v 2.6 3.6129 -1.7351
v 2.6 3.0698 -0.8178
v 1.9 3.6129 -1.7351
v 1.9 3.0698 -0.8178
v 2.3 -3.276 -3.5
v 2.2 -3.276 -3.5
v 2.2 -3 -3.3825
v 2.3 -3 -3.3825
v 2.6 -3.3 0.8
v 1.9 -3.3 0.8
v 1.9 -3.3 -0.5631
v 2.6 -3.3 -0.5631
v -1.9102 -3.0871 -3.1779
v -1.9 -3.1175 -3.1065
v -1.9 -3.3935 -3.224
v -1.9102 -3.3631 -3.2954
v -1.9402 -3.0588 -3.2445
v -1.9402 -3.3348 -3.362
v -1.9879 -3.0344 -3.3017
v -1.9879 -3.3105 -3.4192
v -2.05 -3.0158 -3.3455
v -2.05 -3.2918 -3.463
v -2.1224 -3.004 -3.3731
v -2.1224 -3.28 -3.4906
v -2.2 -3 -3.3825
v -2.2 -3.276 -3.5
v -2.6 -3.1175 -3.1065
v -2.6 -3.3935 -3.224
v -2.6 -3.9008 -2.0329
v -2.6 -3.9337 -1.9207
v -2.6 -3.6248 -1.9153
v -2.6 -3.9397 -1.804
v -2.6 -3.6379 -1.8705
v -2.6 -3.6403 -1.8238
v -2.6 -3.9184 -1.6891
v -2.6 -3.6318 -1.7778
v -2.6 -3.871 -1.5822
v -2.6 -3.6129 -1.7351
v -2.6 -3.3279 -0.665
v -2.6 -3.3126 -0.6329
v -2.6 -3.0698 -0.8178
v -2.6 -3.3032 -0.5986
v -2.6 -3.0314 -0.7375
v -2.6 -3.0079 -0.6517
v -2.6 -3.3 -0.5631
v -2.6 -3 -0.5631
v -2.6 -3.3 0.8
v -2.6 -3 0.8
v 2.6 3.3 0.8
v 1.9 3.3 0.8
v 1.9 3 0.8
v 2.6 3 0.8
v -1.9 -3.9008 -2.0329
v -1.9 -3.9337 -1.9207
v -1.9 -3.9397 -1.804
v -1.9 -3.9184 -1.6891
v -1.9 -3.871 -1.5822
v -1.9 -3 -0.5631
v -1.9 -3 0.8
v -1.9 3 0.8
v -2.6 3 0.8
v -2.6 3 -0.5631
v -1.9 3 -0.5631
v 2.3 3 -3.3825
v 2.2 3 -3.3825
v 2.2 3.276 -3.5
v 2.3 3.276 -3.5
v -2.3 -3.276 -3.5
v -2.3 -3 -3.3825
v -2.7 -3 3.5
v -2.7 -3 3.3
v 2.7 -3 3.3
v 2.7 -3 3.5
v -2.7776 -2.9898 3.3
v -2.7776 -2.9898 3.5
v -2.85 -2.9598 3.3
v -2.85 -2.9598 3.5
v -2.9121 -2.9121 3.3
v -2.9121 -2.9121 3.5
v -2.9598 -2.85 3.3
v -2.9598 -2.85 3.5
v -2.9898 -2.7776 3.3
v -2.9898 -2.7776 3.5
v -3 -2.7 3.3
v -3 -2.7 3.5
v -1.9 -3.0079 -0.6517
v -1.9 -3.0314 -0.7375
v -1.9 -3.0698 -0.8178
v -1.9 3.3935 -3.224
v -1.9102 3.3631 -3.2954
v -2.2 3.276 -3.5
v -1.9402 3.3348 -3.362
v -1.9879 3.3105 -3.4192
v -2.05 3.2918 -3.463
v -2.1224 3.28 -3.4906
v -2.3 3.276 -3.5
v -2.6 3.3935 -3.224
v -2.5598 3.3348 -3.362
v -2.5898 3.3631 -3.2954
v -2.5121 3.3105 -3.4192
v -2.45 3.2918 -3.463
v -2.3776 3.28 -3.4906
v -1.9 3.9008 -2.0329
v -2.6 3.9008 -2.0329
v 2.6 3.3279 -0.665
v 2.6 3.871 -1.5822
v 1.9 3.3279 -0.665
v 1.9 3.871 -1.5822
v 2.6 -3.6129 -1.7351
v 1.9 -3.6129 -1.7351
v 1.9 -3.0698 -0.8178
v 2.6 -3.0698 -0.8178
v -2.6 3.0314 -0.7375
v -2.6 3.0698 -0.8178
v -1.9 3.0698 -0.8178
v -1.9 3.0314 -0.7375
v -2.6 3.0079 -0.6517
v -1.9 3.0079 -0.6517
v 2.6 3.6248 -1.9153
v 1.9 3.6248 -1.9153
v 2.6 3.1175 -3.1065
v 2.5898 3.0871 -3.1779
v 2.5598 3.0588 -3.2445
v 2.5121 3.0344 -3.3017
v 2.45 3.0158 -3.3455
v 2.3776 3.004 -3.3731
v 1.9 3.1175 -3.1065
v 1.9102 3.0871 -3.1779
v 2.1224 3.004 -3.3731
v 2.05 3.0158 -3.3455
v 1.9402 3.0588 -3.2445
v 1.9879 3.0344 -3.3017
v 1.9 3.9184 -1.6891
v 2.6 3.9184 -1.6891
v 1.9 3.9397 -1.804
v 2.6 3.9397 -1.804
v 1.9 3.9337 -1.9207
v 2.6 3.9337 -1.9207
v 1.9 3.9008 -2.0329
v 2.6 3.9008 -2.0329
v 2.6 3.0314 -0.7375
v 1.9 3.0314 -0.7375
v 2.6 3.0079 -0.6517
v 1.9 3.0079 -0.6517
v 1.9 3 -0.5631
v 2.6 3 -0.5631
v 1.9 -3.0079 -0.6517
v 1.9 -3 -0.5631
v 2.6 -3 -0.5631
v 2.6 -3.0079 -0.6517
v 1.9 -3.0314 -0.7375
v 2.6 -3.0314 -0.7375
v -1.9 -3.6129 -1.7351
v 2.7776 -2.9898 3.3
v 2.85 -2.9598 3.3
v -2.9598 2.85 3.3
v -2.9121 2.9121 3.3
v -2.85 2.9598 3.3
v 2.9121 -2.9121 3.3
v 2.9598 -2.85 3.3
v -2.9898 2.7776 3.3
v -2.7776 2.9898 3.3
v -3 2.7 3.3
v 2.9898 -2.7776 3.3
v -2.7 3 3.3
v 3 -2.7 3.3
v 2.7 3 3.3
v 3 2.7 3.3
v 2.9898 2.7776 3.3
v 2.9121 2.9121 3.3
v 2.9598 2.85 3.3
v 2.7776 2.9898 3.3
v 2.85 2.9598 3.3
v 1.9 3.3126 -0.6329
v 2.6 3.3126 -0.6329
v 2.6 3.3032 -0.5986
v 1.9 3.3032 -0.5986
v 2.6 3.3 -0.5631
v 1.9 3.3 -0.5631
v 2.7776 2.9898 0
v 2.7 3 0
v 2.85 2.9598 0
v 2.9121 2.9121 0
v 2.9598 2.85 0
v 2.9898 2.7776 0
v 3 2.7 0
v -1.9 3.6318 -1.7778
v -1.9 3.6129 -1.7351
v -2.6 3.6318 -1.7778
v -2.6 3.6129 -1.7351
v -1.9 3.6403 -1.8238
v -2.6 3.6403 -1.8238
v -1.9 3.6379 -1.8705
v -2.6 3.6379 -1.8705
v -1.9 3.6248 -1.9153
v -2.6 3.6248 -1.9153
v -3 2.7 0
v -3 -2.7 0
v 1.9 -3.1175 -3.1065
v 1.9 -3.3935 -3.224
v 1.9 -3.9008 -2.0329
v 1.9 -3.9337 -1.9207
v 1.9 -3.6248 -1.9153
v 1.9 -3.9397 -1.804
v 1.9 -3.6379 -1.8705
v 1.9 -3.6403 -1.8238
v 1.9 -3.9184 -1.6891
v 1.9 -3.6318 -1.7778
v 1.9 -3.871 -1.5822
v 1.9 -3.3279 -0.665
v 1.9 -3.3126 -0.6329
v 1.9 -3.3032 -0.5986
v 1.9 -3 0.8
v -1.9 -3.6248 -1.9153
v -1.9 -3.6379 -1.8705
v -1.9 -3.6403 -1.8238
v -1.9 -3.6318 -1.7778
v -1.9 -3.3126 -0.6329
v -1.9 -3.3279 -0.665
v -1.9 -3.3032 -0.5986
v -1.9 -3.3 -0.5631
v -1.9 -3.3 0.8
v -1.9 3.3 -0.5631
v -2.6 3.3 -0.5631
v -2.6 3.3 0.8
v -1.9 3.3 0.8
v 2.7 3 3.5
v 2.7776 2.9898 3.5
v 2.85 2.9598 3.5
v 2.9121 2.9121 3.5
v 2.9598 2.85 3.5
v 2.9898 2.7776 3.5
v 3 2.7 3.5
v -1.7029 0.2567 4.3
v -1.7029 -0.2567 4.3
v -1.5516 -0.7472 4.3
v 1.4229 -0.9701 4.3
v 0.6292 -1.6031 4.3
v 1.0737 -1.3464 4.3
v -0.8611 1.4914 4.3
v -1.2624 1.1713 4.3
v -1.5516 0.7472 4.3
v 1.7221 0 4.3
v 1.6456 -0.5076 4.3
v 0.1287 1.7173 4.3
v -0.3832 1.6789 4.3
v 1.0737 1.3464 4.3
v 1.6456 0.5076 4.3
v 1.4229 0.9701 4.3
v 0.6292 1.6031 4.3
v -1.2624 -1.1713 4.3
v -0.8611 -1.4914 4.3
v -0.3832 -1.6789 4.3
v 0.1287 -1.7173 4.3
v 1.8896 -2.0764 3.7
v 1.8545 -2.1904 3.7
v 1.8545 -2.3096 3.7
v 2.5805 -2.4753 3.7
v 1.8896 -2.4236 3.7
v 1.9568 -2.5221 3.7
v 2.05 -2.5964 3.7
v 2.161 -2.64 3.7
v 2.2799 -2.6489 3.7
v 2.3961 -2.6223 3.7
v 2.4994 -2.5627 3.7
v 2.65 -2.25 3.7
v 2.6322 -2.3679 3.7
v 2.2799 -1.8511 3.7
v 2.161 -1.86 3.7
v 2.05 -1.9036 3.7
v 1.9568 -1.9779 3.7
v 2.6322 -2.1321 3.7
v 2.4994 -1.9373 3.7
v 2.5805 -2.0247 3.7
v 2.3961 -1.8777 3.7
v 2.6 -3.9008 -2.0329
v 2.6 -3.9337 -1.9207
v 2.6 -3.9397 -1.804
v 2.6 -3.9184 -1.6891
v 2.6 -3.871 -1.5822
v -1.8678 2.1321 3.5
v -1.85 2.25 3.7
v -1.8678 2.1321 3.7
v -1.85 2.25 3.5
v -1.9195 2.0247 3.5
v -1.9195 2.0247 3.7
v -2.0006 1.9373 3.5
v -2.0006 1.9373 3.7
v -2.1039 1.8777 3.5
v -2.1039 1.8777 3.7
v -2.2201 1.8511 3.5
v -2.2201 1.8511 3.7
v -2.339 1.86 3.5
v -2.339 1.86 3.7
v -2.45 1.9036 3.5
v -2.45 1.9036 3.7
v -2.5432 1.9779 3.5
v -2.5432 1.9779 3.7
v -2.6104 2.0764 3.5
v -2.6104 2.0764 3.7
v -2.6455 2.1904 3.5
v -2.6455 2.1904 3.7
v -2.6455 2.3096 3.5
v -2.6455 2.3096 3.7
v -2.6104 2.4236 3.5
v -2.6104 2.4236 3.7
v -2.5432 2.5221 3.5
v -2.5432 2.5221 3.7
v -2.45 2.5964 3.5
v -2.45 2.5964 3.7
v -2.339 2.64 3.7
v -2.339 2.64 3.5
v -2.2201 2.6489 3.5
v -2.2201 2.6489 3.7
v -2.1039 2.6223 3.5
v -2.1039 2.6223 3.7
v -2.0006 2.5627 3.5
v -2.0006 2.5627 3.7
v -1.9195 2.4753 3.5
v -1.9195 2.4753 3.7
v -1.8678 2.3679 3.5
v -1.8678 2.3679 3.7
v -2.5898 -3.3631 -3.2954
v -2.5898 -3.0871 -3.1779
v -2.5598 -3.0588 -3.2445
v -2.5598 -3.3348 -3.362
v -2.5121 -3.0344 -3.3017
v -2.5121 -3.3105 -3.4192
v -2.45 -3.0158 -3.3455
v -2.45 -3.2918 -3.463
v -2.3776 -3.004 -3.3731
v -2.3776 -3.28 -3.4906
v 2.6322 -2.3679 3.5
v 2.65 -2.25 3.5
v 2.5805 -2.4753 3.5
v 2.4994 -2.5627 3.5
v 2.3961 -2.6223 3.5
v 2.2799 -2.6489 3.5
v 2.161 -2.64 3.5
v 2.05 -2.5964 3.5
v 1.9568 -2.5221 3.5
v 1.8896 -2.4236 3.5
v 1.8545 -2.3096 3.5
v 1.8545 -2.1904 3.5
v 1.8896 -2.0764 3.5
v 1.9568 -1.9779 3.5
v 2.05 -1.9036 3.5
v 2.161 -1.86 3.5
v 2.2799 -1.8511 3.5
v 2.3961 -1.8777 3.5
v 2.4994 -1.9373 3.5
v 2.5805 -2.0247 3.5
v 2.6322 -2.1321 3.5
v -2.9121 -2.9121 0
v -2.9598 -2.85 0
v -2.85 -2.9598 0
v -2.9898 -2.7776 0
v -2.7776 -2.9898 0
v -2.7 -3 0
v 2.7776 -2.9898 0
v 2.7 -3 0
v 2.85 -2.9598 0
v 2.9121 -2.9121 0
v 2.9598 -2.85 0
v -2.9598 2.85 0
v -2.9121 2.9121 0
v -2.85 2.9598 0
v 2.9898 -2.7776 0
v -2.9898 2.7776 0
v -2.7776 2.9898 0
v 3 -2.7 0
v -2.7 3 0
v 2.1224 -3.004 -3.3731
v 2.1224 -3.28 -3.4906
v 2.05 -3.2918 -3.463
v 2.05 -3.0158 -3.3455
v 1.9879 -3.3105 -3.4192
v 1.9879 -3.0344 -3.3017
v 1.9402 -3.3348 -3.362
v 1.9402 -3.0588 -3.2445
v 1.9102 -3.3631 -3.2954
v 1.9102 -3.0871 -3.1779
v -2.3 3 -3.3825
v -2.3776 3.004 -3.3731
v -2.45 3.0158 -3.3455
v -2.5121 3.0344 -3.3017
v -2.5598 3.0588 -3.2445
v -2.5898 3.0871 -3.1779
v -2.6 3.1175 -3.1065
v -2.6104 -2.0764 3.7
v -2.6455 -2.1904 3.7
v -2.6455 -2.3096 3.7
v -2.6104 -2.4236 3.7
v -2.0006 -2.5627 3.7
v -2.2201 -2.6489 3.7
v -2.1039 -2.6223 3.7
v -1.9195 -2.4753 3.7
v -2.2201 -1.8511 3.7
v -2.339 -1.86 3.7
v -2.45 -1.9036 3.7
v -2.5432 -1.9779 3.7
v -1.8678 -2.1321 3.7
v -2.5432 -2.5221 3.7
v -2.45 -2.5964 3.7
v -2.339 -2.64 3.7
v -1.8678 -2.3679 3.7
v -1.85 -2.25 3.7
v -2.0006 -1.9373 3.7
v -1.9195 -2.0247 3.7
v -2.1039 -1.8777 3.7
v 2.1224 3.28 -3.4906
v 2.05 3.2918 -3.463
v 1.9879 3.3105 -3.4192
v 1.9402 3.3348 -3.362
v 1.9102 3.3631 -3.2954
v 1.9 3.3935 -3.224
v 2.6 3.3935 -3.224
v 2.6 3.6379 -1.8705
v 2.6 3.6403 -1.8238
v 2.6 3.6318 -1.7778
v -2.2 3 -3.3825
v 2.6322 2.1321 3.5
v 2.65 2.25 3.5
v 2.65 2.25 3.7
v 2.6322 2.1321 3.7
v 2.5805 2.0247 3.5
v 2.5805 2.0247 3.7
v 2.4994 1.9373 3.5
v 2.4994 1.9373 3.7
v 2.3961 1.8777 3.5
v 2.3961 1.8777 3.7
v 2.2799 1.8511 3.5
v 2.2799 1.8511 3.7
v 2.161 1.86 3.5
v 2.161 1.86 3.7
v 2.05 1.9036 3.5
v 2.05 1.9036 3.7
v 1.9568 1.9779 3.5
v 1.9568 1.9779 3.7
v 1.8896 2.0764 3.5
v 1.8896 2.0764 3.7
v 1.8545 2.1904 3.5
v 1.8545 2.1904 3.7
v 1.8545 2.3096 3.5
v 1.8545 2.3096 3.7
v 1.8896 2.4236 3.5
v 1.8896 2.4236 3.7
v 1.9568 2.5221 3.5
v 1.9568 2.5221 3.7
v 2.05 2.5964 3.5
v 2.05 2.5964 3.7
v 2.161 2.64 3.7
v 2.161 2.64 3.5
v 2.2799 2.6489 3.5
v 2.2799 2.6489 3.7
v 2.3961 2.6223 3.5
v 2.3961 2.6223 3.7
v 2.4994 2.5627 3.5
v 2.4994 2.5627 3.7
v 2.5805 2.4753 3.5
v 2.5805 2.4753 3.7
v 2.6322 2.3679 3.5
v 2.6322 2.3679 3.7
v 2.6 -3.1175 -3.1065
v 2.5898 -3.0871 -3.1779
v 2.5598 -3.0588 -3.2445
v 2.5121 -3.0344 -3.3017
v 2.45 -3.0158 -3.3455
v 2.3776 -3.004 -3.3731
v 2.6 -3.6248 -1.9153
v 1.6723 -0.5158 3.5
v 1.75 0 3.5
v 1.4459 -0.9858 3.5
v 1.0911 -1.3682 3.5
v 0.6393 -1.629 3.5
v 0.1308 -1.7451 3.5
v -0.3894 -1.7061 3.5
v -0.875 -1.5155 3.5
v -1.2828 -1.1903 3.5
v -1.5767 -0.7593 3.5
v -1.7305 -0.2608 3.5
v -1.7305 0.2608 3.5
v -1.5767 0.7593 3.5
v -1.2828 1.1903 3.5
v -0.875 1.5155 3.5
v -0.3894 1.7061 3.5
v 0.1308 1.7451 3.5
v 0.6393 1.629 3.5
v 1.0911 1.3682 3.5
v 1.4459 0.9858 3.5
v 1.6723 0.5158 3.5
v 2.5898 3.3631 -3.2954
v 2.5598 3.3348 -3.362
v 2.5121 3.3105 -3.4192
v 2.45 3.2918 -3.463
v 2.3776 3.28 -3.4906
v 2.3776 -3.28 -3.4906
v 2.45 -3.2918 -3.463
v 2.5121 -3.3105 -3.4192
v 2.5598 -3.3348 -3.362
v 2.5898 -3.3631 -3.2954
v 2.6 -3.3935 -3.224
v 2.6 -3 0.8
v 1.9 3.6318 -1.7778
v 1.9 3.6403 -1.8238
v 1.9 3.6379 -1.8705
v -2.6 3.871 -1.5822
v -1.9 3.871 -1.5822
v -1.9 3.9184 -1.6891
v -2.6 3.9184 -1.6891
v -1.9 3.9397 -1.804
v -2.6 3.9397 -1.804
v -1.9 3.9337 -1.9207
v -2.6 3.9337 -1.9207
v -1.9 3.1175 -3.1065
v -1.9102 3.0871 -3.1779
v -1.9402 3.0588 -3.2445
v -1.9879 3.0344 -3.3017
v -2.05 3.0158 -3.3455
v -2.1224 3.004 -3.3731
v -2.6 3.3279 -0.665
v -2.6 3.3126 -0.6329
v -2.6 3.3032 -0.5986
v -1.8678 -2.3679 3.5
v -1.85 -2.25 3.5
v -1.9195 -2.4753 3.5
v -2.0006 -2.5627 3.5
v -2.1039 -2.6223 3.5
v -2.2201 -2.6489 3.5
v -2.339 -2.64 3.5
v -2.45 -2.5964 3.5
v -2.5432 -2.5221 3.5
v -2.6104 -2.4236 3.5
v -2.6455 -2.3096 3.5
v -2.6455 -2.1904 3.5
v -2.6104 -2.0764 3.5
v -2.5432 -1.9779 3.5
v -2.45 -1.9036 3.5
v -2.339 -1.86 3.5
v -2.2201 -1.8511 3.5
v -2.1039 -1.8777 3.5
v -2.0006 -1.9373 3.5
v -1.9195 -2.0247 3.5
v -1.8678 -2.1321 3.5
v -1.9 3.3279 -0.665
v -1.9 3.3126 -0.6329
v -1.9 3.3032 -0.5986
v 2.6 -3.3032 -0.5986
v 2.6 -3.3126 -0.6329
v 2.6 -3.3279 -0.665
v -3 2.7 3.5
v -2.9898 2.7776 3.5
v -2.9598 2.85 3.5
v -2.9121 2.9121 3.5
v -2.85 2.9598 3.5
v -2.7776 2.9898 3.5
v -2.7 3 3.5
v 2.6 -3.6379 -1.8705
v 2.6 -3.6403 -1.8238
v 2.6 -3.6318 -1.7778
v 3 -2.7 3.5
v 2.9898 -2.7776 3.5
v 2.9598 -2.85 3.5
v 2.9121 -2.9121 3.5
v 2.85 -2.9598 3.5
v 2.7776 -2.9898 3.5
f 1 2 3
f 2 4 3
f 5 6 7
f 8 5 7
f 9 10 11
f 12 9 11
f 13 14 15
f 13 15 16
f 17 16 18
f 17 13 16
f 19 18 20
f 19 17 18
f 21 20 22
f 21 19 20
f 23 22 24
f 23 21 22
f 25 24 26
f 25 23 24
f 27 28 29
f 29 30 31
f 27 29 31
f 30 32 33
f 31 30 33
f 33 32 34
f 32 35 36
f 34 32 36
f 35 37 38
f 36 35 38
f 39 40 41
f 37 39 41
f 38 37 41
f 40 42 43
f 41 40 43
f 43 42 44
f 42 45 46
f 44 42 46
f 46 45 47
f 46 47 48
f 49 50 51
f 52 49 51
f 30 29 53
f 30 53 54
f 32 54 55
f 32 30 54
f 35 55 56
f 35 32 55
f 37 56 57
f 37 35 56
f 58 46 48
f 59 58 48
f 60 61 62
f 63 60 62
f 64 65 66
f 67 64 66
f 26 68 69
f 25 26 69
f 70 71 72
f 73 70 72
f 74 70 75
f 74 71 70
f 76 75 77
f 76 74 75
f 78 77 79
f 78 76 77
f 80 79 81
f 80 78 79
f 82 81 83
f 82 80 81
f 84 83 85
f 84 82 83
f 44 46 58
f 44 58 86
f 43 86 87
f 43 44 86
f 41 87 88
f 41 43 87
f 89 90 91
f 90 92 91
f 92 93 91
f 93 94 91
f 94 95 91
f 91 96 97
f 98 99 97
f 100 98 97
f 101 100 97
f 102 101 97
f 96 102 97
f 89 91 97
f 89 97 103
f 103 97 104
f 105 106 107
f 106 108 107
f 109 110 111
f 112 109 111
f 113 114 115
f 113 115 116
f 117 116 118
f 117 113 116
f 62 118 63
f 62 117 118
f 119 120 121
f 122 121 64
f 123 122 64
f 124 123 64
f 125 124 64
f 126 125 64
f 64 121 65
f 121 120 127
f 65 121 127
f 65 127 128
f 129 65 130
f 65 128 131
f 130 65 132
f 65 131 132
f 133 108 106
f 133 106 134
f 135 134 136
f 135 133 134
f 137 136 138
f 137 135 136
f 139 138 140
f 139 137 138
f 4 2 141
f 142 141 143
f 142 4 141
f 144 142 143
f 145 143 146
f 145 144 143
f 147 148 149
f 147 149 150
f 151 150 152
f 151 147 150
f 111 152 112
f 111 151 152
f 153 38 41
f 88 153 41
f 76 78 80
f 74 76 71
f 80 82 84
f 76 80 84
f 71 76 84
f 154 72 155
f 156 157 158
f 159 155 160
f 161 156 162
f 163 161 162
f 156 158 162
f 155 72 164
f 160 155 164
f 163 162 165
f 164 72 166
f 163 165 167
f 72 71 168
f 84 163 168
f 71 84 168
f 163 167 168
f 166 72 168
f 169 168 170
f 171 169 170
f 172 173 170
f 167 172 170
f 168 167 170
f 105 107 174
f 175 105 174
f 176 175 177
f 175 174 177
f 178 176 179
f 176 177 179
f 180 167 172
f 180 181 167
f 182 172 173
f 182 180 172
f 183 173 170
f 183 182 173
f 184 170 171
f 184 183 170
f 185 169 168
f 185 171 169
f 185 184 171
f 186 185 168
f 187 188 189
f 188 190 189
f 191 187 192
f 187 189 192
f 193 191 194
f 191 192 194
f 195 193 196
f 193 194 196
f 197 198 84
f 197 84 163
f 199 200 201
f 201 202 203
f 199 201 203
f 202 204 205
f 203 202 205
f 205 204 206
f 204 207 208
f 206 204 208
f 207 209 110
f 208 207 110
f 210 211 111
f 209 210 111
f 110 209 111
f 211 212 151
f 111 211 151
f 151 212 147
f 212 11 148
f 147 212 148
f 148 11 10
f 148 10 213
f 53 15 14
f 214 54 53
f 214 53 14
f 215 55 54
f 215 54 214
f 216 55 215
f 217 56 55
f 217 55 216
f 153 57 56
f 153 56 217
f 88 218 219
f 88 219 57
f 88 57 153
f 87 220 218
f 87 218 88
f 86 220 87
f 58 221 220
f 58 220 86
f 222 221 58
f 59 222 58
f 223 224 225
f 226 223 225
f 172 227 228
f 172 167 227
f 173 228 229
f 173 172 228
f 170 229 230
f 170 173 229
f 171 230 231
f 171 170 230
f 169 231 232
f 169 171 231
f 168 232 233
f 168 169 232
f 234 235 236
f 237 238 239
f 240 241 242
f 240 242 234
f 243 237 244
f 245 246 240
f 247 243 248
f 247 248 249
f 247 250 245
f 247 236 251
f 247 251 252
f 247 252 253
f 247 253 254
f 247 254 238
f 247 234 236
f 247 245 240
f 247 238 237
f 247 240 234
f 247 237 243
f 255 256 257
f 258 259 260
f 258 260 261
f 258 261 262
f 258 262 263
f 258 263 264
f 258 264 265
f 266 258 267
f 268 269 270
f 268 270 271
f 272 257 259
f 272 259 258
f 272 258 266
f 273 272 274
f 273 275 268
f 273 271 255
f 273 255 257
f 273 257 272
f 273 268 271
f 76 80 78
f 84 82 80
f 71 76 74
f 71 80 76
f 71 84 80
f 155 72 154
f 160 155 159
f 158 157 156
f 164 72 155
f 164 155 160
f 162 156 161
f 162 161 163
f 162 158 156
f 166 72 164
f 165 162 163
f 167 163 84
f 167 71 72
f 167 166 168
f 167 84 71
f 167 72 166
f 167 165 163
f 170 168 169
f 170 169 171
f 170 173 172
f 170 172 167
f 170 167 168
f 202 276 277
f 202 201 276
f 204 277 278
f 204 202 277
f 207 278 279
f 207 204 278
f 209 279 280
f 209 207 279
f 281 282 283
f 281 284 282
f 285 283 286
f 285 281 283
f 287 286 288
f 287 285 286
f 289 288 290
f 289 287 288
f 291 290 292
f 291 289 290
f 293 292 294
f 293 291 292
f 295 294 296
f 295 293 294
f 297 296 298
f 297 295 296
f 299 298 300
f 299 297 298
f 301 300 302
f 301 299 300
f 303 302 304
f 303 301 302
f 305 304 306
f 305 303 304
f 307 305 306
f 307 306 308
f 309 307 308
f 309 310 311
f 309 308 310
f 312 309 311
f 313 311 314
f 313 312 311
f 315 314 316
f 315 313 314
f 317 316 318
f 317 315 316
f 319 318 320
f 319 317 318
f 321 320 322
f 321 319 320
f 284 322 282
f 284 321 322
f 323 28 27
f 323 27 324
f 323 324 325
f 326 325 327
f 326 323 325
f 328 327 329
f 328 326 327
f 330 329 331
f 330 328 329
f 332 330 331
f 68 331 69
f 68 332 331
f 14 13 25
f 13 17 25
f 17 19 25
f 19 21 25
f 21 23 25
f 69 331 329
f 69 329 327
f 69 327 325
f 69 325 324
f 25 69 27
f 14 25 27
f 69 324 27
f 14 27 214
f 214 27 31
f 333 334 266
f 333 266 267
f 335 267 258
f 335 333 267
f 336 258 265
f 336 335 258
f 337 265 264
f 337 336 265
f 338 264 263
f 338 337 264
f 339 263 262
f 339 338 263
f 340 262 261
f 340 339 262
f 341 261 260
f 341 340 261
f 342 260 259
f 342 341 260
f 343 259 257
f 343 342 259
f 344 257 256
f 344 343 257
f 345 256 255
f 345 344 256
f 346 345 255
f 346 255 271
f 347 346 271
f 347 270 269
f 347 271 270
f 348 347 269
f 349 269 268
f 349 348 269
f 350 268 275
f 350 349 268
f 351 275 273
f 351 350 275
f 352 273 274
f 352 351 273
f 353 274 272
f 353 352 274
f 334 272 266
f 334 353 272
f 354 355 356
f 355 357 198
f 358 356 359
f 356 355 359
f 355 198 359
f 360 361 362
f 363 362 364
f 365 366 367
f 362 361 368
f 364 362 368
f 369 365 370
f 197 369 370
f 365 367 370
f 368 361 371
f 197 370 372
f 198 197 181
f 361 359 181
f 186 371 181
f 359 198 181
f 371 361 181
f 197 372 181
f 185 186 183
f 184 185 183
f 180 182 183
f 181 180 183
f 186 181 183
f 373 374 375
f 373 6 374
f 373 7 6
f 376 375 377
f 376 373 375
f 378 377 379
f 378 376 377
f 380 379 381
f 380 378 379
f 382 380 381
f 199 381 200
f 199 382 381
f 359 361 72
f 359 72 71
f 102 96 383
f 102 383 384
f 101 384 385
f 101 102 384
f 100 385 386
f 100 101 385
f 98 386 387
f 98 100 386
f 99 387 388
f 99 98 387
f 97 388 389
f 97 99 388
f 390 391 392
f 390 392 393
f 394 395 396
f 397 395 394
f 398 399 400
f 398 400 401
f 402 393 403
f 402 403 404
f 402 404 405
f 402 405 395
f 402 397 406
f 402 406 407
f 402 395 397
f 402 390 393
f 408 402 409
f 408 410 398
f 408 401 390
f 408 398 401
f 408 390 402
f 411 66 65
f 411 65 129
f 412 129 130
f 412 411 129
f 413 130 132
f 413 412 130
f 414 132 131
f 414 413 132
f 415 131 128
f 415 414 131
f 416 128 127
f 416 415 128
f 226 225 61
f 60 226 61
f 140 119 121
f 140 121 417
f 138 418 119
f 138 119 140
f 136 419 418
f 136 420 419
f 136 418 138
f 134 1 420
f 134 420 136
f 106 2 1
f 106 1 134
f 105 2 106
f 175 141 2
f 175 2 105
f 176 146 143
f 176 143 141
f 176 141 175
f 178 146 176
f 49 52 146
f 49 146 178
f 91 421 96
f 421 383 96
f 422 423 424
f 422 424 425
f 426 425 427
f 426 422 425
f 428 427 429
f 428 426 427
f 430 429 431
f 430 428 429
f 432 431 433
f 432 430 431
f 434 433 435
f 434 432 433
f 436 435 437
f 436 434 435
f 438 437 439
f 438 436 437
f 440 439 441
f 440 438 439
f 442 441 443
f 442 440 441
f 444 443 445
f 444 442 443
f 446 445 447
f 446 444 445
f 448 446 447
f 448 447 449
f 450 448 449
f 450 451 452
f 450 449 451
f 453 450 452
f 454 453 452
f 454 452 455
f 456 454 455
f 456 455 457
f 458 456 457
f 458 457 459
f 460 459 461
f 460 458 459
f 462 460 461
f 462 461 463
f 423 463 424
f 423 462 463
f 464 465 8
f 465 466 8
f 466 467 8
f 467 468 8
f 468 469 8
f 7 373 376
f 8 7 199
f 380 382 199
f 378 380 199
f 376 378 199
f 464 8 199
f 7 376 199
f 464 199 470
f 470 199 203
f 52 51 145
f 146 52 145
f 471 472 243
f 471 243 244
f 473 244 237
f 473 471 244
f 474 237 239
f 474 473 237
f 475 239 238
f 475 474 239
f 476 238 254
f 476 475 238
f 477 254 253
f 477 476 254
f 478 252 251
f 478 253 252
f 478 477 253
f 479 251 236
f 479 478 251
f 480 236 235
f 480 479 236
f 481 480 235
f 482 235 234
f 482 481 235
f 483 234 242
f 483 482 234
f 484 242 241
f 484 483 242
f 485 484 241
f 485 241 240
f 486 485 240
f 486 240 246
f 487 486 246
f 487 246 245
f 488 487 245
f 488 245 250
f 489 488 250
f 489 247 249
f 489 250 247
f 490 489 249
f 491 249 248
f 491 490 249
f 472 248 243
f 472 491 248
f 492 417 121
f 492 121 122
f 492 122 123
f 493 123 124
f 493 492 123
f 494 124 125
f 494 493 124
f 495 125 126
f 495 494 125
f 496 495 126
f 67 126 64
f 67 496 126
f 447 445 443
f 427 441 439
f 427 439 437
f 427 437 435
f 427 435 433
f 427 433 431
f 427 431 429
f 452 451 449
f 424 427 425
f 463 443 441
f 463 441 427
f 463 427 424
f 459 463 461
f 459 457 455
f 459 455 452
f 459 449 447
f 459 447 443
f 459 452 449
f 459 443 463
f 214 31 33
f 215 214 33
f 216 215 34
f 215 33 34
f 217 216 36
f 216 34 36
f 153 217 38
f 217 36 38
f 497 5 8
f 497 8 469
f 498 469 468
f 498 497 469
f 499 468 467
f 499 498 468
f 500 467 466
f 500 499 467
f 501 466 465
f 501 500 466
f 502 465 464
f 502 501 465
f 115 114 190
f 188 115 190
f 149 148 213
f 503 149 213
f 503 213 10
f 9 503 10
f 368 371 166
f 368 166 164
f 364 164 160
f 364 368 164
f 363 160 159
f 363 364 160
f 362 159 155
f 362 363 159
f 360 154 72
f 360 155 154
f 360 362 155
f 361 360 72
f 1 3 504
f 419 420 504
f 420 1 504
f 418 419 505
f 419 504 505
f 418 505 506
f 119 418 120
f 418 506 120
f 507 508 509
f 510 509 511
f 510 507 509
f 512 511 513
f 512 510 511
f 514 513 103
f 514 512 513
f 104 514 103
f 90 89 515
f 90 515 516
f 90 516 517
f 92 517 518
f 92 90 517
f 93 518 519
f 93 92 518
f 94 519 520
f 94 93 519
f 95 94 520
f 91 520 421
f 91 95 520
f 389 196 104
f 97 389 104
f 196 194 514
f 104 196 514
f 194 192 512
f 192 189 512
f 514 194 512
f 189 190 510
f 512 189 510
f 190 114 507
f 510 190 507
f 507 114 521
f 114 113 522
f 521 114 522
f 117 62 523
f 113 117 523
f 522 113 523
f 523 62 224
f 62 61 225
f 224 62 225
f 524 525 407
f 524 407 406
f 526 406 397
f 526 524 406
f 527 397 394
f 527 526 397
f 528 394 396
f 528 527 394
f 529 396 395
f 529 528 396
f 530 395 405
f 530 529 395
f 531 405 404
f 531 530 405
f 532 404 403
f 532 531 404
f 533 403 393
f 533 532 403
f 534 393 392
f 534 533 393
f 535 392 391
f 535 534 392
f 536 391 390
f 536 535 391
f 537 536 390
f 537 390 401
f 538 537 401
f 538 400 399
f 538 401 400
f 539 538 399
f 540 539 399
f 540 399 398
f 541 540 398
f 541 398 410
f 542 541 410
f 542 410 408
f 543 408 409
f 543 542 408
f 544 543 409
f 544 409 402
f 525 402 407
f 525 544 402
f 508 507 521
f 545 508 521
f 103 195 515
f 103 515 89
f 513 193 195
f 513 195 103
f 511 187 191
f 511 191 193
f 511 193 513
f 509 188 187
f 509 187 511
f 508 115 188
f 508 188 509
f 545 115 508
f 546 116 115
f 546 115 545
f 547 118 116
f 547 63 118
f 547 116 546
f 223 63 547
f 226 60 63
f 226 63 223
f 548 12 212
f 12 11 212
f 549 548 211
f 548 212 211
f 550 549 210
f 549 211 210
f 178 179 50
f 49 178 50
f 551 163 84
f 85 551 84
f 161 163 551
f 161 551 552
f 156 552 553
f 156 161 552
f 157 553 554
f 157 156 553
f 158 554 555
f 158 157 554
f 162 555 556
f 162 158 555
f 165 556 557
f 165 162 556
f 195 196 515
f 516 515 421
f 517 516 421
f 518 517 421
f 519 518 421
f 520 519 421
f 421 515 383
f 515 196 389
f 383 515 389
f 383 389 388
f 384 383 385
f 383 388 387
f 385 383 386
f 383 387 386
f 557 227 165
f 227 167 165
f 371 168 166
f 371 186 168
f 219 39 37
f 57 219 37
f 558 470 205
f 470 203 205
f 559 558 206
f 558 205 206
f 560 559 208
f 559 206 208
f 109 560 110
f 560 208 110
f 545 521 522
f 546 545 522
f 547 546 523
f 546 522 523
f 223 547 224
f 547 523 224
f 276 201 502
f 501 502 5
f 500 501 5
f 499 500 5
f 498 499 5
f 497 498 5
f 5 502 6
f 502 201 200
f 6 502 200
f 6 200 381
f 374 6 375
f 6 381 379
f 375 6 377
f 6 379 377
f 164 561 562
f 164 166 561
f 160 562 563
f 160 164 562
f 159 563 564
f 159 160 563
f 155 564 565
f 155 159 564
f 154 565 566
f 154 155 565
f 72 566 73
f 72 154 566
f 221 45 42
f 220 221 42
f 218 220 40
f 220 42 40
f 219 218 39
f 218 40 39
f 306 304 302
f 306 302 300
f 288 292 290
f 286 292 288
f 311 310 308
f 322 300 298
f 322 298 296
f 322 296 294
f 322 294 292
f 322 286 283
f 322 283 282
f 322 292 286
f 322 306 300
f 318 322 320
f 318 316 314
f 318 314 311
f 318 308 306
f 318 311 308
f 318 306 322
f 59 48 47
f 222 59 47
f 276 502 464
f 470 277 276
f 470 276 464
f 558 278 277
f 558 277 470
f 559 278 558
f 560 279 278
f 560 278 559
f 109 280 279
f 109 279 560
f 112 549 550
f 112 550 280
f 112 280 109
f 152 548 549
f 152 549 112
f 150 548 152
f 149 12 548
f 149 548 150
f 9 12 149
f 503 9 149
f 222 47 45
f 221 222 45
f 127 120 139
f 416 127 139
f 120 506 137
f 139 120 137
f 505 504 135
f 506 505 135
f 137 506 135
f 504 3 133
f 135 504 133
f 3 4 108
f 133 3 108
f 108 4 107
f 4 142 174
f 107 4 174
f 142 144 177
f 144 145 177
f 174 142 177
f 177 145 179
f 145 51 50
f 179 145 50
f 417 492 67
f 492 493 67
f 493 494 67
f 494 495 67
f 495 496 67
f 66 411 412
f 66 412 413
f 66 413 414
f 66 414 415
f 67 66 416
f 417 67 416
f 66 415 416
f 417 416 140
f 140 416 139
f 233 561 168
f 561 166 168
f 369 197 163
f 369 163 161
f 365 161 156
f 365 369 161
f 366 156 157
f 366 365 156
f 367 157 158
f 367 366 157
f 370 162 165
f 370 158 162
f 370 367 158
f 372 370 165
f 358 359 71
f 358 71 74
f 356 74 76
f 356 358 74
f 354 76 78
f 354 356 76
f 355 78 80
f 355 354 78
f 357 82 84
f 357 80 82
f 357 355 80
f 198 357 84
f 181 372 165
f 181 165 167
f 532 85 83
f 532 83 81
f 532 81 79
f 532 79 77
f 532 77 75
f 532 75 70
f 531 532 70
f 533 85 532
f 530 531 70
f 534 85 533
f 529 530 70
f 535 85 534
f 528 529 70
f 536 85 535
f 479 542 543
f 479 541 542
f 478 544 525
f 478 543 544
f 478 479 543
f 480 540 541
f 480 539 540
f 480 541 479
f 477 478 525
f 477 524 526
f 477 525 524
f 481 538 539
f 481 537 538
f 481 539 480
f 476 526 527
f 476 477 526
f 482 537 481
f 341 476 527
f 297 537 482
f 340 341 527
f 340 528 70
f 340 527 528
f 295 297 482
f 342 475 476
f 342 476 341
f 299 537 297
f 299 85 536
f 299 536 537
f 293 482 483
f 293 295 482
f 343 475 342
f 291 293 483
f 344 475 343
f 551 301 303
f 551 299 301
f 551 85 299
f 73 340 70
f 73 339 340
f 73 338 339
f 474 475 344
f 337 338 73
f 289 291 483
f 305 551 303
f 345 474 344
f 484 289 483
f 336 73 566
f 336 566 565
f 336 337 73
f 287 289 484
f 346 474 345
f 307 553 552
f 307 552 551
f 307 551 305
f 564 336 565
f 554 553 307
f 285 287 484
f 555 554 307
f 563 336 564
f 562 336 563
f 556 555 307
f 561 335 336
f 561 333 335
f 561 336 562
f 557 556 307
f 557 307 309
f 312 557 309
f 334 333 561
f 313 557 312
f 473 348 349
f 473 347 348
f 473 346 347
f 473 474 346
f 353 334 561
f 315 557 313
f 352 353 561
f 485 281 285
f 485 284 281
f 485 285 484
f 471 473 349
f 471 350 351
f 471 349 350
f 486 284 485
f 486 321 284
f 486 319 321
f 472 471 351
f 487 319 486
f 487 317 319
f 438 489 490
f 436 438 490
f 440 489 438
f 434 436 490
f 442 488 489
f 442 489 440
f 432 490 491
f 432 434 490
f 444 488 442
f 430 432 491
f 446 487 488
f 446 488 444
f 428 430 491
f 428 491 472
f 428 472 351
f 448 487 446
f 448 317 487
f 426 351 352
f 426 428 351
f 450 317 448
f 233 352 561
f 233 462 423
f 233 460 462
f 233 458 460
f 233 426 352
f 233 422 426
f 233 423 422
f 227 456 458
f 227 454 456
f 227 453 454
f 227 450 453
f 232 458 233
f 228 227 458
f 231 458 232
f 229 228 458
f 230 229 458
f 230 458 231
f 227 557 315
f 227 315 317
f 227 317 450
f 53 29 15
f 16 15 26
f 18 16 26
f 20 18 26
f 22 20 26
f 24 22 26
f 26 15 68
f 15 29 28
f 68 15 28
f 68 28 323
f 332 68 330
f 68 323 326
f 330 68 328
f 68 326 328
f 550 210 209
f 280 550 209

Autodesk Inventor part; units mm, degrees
ref_plane "YZ Plane" through (0, 0, 0) normal (1, 0, 0) x (0, 1, 0)
ref_plane "XZ Plane" through (0, 0, 0) normal (0, 1, 0) x (-1, 0, 0)
ref_plane "XY Plane" through (0, 0, 0) normal (0, 0, 1) x (1, 0, 0)
sketch "Boceto39" plane through (0, 0, 0) normal (0, 0, 1) x (1, 0, 0)
  line L0 (-2.7, 3) -> (2.7, 3)
  line L1 (3, 2.7) -> (3, -2.7)
  line L2 (2.7, -3) -> (-2.7, -3)
  line L3 (-3, -2.7) -> (-3, 2.7)
  arc A0 (3, 2.7) -> (2.7, 3) centre (2.7, 2.7) ccw
  arc A1 (-2.7, 3) -> (-3, 2.7) centre (-2.7, 2.7) ccw
  arc A2 (-3, -2.7) -> (-2.7, -3) centre (-2.7, -2.7) ccw
  arc A3 (2.7, -3) -> (3, -2.7) centre (2.7, -2.7) ccw
  point P0 (0, 0)
  point P1 (-3, 3)
  point P2 (3, -3)
  point P3 (3, 3)
  point P4 (-3, -3)
  point P5 (0, 3)
  point P6 (3, 0)
  dimension "d373" = 6
  dimension "d376" = 0.3
extrude "Extrusión13" add sketch "Boceto39" along normal blind 3.3
sketch "Boceto40" plane through (0, 0, 3.3) normal (0, 0, 1) x (1, 0, 0)
  line L0 (2.7, 3) -> (-2.7, 3) projected
  arc A0 (-2.7, 3) -> (-3, 2.7) centre (-2.7, 2.7) ccw projected
  line L1 (-3, 2.7) -> (-3, -2.7) projected
  arc A1 (-3, -2.7) -> (-2.7, -3) centre (-2.7, -2.7) ccw projected
  line L2 (-2.7, -3) -> (2.7, -3) projected
  arc A2 (2.7, -3) -> (3, -2.7) centre (2.7, -2.7) ccw projected
  line L3 (3, -2.7) -> (3, 2.7) projected
  arc A3 (3, 2.7) -> (2.7, 3) centre (2.7, 2.7) ccw projected
  point P0 (0, 0)
extrude "Extrusión14" add sketch "Boceto40" along normal blind 0.2 separate body
sketch "Boceto43" plane through (0, 0, 0) normal (1, 0, 0) x (0, 1, 0)
  line L0 (0, 0) -> (0, -3.6276) construction
  line L1 (3, 0) -> (3, 3.3) construction
  line L2 (3, 0.8) -> (3, -0.5631)
  line L3 (3.0698, -0.8178) -> (3.6129, -1.7351)
  line L4 (3.6248, -1.9153) -> (3, -3.3825)
  line L5 (3, -3.3825) -> (3.276, -3.5)
  line L6 (3.276, -3.5) -> (3.9008, -2.0329)
  line L7 (3.871, -1.5822) -> (3.3279, -0.665)
  line L8 (3.3, -0.5631) -> (3.3, 0.8)
  line L9 (3.3, 0.8) -> (3, 0.8)
  line L10 (2.7, 3.5) -> (-2.7, 3.5) projected
  line L11 (2.7, 0) -> (-2.7, 0) projected
  arc A0 (3.6248, -1.9153) -> (3.6129, -1.7351) centre (3.4408, -1.837) ccw
  arc A1 (3.3, -0.5631) -> (3.3279, -0.665) centre (3.5, -0.5631) ccw
  arc A2 (3.9008, -2.0329) -> (3.871, -1.5822) centre (3.4408, -1.837) ccw
  arc A3 (3, -0.5631) -> (3.0698, -0.8178) centre (3.5, -0.5631) ccw
  point P0 (3, -0.7)
  point P1 (4, -1.8)
  dimension "d399" = 2.7
  dimension "d400" = 0.3
  dimension "d401" = 0.3
  dimension "d402" = 0.3
  dimension "d403" = 0.7
  dimension "d404" = 4
  dimension "d405" = 3
  dimension "d406" = 1.8
  dimension "d407" = 3.5
  dimension "d408" = 0.2
  dimension "d409" = 0.5
extrude "Extrusión15" add sketch "Boceto43" along normal mid plane 5.2 separate body
sketch "Boceto45" plane through (0, 0, 0) normal (1, 0, 0) x (0, 1, 0)
  line L0 (3, 0.8) -> (3, -0.5631) projected
  line L1 (3, 0.8) -> (3.3, 0.8) projected
  line L2 (3, 0.8) -> (4.0467, 0.8)
  line L3 (4.0467, 0.8) -> (4.0467, -3.761)
  line L4 (4.0467, -3.761) -> (3, -3.761)
  line L5 (3, -3.761) -> (3, 0.8)
  point P0 (0, 0)
extrude "Extrusión17" cut sketch "Boceto45" along normal mid plane 3.8 bodies 3
fillet "Empalme44" radius 0.3 4 edges at (2.6, 3.138, -3.4412) (1.9, 3.138, -3.4412) (-1.9, 3.138, -3.4412) (-2.6, 3.138, -3.4412)
mirror "Simetría1" about plane through (0, 0, 0) normal (0, 1, 0) of "Extrusión15", "Extrusión17", "Empalme44" bodies 3
sketch "Boceto46" plane through (0, 0, 3.5) normal (0, 0, 1) x (1, 0, 0)
  line L0 (-2.25, -2.25) -> (2.25, -2.25) construction
  line L1 (2.25, -2.25) -> (2.25, 2.25) construction
  line L2 (2.25, 2.25) -> (-2.25, 2.25) construction
  line L3 (-2.25, 2.25) -> (-2.25, -2.25) construction
  circle A0 centre (-2.25, -2.25) radius 0.4
  circle A1 centre (-2.25, 2.25) radius 0.4
  circle A2 centre (2.25, 2.25) radius 0.4
  circle A3 centre (2.25, -2.25) radius 0.4
  point P0 (0, 0)
  point P1 (0, -2.25)
  point P2 (-2.25, 0)
  dimension "d417" = 0.8
  dimension "d418" = 4.5
extrude "Extrusión18" add sketch "Boceto46" along normal blind 0.2 bodies 2
sketch "Boceto48" plane through (0, 0, 0) normal (0, 1, 0) x (-1, 0, 0)
  line L0 (0, 0) -> (0, 17.1627)
  line L1 (-2.7, 3.5) -> (2.7, 3.5) construction
  line L2 (0, 3.5) -> (-1.75, 3.5)
  line L3 (-1.75, 3.5) -> (-1.7221, 4.3)
  line L4 (-1.7221, 4.3) -> (0, 4.3)
  line L5 (0, 4.3) -> (0, 3.5)
  line L6 (-2.7, 0) -> (2.7, 0) projected
  line L7 (-1.75, 3.5) -> (-1.75, 4.1675) construction
  dimension "d422" = 4.3
  dimension "d423" = 3.5
  dimension "d424" = 2
revolve "Revolución14" add sketch "Boceto48" angle 360 about axis through (0, 0, 0) along (0, 0, 1) bodies 2
properties part number "TACT-SWITCH-THT-06X06MM"
